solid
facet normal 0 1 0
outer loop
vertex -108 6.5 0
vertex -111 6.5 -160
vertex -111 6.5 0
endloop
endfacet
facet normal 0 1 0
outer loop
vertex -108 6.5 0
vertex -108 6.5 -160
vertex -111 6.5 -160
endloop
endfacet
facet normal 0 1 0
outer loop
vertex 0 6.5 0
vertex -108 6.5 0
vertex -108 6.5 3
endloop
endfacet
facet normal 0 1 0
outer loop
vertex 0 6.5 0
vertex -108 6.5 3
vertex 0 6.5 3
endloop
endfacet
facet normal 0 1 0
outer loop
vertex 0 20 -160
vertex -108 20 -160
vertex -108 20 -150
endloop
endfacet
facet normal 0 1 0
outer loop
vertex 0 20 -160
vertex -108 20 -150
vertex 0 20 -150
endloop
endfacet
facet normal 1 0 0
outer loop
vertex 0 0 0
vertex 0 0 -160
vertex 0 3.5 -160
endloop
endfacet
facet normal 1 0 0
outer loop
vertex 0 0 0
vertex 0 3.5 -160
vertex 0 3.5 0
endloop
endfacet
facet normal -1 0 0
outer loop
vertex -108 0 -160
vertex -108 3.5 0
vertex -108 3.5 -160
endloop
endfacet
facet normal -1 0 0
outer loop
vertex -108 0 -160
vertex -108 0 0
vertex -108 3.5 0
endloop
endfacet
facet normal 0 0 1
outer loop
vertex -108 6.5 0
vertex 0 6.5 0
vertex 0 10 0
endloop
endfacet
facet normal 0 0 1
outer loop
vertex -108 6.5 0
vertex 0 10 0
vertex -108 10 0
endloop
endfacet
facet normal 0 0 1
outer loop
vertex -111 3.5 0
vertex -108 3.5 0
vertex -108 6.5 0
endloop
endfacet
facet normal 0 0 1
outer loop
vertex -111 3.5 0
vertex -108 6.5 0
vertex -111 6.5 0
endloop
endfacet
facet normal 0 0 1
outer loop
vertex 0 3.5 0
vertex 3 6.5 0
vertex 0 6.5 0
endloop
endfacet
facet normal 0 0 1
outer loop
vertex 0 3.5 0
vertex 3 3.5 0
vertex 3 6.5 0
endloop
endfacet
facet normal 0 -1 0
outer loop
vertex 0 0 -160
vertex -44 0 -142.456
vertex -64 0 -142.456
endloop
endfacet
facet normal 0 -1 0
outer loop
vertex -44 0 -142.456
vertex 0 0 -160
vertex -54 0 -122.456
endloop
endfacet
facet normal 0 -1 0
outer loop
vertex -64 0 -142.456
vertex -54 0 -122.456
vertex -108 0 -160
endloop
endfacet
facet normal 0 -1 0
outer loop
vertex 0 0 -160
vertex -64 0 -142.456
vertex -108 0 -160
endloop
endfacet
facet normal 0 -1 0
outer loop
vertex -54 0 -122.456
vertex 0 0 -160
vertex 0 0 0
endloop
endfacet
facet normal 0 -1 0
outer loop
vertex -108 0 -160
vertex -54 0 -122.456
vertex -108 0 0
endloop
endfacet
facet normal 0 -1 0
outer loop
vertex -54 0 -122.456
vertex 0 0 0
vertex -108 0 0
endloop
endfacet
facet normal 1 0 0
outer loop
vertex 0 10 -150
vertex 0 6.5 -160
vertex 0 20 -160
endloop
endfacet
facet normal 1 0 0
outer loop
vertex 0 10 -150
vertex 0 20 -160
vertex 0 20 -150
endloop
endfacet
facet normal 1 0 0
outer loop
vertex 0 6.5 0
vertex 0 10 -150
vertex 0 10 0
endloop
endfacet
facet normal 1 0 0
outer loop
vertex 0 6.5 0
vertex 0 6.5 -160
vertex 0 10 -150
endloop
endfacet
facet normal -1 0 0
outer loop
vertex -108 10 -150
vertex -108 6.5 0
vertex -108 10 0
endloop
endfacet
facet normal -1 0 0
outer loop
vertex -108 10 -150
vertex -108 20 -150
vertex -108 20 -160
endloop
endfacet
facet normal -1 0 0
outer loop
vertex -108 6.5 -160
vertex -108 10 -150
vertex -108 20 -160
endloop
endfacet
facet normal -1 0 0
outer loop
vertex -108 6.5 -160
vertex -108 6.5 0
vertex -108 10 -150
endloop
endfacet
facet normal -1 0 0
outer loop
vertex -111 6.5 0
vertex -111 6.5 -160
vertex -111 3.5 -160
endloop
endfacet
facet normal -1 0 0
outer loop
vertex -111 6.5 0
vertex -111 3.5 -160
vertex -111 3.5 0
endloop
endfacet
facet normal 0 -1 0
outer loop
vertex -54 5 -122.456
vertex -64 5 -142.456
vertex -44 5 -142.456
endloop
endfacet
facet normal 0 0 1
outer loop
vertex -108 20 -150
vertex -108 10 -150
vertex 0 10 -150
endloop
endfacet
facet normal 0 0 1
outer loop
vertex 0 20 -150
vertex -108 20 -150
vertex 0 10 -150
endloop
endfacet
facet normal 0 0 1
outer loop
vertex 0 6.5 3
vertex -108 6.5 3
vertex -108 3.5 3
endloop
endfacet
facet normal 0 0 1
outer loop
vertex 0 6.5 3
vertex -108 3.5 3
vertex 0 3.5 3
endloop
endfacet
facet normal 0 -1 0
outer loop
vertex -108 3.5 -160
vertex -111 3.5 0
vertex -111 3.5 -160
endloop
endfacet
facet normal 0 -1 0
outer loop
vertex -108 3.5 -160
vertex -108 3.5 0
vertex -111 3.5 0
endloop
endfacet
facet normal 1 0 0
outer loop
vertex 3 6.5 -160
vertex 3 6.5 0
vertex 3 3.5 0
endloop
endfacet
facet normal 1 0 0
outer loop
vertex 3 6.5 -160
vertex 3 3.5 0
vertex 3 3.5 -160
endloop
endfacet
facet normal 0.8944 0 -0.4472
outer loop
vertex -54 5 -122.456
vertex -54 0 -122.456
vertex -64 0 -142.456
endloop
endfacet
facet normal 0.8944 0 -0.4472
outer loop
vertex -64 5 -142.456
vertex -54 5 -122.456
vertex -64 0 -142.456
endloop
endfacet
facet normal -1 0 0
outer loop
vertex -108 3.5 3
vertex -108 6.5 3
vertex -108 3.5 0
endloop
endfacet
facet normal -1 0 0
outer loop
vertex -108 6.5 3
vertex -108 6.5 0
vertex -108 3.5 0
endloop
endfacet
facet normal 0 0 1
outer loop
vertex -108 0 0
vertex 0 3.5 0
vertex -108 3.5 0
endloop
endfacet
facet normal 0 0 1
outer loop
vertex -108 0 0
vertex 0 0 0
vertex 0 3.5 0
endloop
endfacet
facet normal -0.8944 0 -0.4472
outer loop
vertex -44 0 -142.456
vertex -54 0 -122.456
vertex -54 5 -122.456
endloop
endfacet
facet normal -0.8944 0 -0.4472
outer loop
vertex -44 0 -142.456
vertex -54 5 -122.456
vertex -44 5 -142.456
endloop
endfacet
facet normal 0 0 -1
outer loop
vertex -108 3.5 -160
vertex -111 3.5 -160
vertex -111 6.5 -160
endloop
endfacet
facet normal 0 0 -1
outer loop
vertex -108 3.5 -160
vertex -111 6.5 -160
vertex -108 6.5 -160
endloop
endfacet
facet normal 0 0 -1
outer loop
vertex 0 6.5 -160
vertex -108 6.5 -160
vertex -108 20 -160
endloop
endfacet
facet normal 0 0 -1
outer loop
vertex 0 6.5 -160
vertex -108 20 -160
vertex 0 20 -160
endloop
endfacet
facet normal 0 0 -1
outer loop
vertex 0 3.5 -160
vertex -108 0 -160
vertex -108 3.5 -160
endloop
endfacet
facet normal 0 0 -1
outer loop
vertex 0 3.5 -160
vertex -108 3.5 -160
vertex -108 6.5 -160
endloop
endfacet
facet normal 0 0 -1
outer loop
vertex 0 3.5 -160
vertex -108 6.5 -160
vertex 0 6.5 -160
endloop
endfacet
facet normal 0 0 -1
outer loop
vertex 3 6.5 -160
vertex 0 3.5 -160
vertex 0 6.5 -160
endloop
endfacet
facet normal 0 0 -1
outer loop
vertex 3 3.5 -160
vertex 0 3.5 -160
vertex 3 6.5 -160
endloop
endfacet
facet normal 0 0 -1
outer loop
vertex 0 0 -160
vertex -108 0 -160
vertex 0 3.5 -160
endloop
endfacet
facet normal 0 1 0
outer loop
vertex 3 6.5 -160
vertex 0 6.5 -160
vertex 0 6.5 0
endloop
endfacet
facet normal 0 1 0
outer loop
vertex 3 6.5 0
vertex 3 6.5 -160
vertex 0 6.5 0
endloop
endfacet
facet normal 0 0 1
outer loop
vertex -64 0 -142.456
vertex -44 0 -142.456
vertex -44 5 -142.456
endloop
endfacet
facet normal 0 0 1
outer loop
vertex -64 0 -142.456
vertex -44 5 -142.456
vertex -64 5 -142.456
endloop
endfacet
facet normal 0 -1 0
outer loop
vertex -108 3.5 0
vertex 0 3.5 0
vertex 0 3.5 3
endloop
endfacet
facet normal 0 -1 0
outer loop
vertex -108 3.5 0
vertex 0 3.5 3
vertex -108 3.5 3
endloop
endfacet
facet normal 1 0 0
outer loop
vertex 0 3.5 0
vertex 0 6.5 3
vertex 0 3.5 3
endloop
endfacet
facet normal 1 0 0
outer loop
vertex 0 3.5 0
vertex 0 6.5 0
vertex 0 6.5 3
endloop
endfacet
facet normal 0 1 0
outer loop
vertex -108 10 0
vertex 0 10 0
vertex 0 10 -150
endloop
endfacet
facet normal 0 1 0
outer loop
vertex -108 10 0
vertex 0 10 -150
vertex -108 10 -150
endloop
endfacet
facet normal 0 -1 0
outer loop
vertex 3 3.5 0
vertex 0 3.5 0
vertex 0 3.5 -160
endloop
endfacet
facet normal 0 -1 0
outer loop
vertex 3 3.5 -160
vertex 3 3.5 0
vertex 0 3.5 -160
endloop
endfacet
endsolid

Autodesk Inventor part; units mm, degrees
ref_plane "YZ Plane" through (0, 0, 0) normal (1, 0, 0) x (0, 1, 0)
ref_plane "XZ Plane" through (0, 0, 0) normal (0, 1, 0) x (-1, 0, 0)
ref_plane "XY Plane" through (0, 0, 0) normal (0, 0, 1) x (1, 0, 0)
sketch "Esquisse1" plane through (0, 0, 0) normal (0, 1, 0) x (-1, 0, 0)
  line L0 (0, 0) -> (108, 0)
  line L1 (108, 0) -> (108, -160)
  line L2 (108, -160) -> (0, -160)
  line L3 (0, -160) -> (0, 0)
  dimension "d0" = 108
  dimension "d1" = 160
extrude "Extrusion1" add sketch "Esquisse1" along normal blind 10
sketch "Esquisse2" plane through (0, 10, 0) normal (0, 1, 0) x (1, 0, 0)
  line L0 (0, 160) -> (-108, 160) projected
  line L1 (-108, 160) -> (-108, 0) projected
  line L2 (0, 160) -> (-108, 160)
  line L3 (-108, 160) -> (-108, 150)
  line L4 (-108, 150) -> (0, 150)
  line L5 (0, 150) -> (0, 160)
  point P0 (0, 0)
  dimension "d4" = 10
extrude "Extrusion2" add sketch "Esquisse2" along normal blind 10
sketch "Esquisse3" plane through (0, 0, 0) normal (0, -1, 0) x (1, 0, 0)
  line L0 (-44, -142.4556) -> (-64, -142.4556)
  line L1 (0, 0) -> (0, -160) projected
  line L2 (-108, -160) -> (-108, 0) projected
  line L3 (-54, -122.4556) -> (-64, -142.4556)
  line L4 (-54, -122.4556) -> (-44, -142.4556)
  dimension "d7" = 20
  dimension "d8" = 44
  dimension "d9" = 44
extrude "Extrusion3" cut sketch "Esquisse3" against normal blind 5
sketch "Esquisse4" plane through (-108, 0, -160) normal (-1, 0, 0) x (0, 0, 1)
  line L0 (0, 0) -> (0, 20) projected
  line L1 (0, 6.5) -> (160, 6.5)
  line L2 (160, 0) -> (0, 0) projected
  line L3 (160, 6.5) -> (160, 3.5)
  line L4 (160, 3.5) -> (0, 3.5)
  line L5 (17.5444, 5) -> (37.5444, 5) projected
  line L6 (0, 3.5) -> (0, 6.5)
  point P0 (0, 3.5)
  dimension "d13" = 3
  dimension "d14" = 3.5
extrude "Extrusion4" add sketch "Esquisse4" along normal blind 3
sketch "Esquisse5" plane through (0, 0, 0) normal (1, 0, 0) x (0, 0, -1)
  line L0 (0, 3.5) -> (160, 3.5) projected
  line L1 (0, 3.5) -> (160, 3.5)
  line L2 (160, 6.5) -> (0, 6.5) projected
  line L3 (160, 3.5) -> (160, 6.5)
  line L4 (160, 6.5) -> (160, 3.5)
  line L5 (0, 6.5) -> (160, 6.5)
  line L6 (0, 6.5) -> (0, 3.5)
  line L7 (0, 0) -> (0, 10) projected
extrude "Extrusion5" add sketch "Esquisse5" along normal blind 3
sketch "Esquisse6" plane through (-108, 0, 0) normal (0, 0, 1) x (1, 0, 0)
  line L0 (0, 6.5) -> (-3, 6.5) projected
  line L1 (108, 6.5) -> (108, 10) projected
  line L2 (0, 6.5) -> (108, 6.5)
  line L3 (0, 3.5) -> (-3, 3.5) projected
  line L4 (108, 3.5) -> (0, 3.5)
  line L5 (0, 6.5) -> (0, 10) projected
  line L6 (0, 6.5) -> (0, 3.5)
  line L7 (108, 6.5) -> (108, 3.5)
  point P0 (108, 0)
extrude "Extrusion6" add sketch "Esquisse6" along normal blind 3
properties part number "couvercle pilier"
